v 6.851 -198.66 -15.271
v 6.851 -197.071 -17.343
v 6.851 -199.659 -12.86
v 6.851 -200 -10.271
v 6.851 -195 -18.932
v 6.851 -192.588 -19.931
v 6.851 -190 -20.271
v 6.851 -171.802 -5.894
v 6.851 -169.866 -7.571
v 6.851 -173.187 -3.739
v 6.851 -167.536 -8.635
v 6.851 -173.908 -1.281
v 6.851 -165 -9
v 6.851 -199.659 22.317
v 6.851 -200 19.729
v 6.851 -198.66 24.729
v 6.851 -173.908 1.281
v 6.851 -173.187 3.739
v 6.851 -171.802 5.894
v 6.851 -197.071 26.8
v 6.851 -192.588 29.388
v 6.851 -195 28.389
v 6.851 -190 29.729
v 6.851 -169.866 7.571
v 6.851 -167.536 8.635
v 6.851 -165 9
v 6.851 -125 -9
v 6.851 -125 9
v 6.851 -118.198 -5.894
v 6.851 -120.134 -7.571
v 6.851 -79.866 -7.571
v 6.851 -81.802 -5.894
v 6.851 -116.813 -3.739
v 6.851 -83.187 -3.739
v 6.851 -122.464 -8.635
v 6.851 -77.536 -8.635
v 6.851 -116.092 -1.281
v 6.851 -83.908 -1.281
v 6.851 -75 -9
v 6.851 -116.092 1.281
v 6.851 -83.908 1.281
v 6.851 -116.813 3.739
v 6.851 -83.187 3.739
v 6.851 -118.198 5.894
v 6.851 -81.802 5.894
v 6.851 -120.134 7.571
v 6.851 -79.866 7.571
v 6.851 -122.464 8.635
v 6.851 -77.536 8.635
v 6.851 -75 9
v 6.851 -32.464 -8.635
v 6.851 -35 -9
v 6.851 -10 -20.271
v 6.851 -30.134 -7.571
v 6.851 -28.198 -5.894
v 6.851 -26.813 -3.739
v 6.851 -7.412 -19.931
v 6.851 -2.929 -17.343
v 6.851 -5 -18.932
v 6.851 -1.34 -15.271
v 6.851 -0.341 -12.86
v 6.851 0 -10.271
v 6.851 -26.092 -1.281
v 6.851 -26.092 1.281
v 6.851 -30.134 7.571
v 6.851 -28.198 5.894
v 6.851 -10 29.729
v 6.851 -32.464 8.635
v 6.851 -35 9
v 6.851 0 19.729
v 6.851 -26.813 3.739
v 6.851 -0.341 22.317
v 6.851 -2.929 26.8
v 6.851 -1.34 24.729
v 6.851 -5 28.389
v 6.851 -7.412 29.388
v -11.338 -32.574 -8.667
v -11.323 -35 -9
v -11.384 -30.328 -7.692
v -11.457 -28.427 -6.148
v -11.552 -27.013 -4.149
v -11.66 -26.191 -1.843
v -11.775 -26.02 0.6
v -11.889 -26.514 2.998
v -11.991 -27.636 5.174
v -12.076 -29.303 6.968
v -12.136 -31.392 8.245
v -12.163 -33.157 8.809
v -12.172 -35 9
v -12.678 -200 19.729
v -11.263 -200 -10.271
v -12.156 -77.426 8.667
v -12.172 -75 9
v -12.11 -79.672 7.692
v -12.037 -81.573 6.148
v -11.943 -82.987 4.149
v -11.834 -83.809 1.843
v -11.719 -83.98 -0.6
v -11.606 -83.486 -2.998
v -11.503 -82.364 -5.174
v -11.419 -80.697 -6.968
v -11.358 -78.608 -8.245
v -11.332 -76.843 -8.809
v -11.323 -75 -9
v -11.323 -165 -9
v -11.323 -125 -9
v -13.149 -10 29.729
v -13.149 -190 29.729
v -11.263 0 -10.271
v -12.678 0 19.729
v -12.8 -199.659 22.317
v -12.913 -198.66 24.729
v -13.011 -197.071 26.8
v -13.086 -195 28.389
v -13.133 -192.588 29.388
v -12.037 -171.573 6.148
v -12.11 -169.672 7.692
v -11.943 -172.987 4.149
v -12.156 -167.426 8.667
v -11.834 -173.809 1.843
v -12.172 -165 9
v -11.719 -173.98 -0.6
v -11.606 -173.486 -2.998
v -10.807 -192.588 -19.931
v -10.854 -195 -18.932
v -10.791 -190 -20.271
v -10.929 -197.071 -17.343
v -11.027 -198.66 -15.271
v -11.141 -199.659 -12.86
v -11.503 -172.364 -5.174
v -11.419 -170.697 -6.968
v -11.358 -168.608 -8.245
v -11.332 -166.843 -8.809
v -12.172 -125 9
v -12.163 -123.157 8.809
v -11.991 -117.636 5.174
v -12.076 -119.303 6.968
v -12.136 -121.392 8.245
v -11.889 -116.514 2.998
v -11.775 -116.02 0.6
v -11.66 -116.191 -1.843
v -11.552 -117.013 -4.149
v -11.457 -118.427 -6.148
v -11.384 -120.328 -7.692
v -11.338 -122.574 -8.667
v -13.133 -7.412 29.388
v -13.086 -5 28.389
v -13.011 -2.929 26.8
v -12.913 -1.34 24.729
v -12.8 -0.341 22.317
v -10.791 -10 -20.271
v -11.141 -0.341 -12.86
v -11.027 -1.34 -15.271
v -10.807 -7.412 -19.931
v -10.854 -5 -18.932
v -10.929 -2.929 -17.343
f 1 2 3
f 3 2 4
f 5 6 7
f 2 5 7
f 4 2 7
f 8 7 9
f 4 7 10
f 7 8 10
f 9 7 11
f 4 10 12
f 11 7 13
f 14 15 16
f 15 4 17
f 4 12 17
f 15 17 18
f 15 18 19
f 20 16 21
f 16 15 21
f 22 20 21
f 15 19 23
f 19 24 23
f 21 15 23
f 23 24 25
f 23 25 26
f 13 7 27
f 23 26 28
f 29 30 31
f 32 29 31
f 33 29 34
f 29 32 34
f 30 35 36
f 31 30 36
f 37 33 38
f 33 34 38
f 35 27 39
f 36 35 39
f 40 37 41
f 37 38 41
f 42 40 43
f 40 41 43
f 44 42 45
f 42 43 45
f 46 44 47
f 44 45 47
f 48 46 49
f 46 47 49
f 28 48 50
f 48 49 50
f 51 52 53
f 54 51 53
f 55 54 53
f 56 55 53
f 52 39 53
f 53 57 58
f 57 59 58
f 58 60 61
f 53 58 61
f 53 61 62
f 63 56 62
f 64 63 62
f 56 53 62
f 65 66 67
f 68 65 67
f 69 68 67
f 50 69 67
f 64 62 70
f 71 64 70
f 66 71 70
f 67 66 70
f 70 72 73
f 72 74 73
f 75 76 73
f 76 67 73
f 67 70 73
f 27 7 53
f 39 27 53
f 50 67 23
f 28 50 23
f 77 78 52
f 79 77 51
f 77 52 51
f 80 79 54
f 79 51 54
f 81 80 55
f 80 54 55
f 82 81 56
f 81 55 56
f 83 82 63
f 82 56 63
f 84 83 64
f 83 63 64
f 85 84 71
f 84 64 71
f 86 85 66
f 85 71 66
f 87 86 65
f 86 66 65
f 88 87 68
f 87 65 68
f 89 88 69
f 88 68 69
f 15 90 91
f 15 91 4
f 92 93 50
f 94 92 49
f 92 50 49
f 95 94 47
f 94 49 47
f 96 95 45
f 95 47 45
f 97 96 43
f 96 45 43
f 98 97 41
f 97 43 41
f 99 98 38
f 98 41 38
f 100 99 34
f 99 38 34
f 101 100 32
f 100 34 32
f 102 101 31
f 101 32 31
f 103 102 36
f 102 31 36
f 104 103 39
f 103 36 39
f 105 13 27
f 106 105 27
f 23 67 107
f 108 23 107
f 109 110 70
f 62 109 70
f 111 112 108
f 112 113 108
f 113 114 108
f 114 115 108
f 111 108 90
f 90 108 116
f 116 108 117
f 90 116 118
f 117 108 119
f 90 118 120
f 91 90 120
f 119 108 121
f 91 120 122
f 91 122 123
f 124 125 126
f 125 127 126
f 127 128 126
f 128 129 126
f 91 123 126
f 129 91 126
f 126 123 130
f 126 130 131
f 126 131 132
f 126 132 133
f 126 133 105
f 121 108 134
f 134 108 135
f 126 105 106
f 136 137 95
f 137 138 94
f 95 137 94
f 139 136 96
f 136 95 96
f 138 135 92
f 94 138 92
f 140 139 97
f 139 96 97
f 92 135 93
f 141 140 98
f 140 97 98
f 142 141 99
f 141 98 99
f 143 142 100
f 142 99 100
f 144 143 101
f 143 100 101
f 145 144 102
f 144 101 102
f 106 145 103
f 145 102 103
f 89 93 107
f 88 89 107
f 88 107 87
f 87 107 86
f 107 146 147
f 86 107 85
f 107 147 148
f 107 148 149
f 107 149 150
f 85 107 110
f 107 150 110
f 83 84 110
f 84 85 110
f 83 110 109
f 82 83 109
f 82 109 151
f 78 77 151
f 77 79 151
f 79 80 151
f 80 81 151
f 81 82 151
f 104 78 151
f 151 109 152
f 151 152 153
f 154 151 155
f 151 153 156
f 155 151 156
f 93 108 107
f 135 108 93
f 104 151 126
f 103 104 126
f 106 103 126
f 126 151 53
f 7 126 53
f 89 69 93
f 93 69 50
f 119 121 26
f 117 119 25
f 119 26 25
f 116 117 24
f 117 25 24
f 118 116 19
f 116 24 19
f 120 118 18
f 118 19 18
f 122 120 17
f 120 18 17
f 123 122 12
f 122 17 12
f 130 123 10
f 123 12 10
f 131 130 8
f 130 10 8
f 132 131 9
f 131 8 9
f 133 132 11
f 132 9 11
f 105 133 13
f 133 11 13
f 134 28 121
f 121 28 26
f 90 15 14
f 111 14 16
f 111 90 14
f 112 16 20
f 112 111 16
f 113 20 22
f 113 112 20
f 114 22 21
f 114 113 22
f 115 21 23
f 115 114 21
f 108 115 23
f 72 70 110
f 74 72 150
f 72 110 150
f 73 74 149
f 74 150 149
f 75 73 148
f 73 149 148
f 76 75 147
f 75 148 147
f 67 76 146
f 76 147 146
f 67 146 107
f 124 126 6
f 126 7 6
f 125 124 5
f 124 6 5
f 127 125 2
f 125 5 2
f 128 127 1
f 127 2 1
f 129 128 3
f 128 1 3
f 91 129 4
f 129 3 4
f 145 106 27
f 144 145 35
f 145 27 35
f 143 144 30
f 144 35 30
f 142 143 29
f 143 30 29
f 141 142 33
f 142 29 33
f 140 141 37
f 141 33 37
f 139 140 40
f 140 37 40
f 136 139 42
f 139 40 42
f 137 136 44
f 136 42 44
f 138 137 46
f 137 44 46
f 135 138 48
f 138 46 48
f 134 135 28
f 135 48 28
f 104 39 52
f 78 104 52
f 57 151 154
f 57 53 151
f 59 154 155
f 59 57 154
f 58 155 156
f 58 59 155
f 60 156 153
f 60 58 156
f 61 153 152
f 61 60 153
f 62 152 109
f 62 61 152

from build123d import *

# Parameters (mm, degrees)
F1_DEPTH = 200
F3_DEPTH = 20.001
F4_R     = 10


with BuildPart() as f1:
    # F0 (on Front) → F1 (new body)
    with BuildSketch(Plane.XZ):
        Polygon((6.850831, -20.271453), (6.850831, 29.728547), (-13.149169, 29.728547), (-10.791229, -20.271453), align=None)
    extrude(amount=F1_DEPTH)

    # F2 (on face) → F3 (cut, through all)
    with BuildSketch(Plane.YZ.offset(6.850831)):
        with BuildLine():
            Line((-125, 9), (-165, 9))
            ThreePointArc((-165, 9), (-174, 0), (-165, -9))
            Line((-165, -9), (-125, -9))
            ThreePointArc((-125, -9), (-116, 0), (-125, 9))
        make_face()
        with BuildLine():
            Line((-35, 9), (-75, 9))
            ThreePointArc((-75, 9), (-84, 0), (-75, -9))
            Line((-75, -9), (-35, -9))
            ThreePointArc((-35, -9), (-26, 0), (-35, 9))
        make_face()
    extrude(amount=-F3_DEPTH, mode=Mode.SUBTRACT)

    # F4
    f4_edges = [f1.edges().sort_by_distance(p)[0] for p in [
        (-3.149169, -200, 29.728547),
        (-1.970199, -200, -20.271453),
        (-1.970199, 0, -20.271453),
        (-3.149169, 0, 29.728547),
    ]]
    fillet(f4_edges, radius=F4_R)


solid = f1.part
